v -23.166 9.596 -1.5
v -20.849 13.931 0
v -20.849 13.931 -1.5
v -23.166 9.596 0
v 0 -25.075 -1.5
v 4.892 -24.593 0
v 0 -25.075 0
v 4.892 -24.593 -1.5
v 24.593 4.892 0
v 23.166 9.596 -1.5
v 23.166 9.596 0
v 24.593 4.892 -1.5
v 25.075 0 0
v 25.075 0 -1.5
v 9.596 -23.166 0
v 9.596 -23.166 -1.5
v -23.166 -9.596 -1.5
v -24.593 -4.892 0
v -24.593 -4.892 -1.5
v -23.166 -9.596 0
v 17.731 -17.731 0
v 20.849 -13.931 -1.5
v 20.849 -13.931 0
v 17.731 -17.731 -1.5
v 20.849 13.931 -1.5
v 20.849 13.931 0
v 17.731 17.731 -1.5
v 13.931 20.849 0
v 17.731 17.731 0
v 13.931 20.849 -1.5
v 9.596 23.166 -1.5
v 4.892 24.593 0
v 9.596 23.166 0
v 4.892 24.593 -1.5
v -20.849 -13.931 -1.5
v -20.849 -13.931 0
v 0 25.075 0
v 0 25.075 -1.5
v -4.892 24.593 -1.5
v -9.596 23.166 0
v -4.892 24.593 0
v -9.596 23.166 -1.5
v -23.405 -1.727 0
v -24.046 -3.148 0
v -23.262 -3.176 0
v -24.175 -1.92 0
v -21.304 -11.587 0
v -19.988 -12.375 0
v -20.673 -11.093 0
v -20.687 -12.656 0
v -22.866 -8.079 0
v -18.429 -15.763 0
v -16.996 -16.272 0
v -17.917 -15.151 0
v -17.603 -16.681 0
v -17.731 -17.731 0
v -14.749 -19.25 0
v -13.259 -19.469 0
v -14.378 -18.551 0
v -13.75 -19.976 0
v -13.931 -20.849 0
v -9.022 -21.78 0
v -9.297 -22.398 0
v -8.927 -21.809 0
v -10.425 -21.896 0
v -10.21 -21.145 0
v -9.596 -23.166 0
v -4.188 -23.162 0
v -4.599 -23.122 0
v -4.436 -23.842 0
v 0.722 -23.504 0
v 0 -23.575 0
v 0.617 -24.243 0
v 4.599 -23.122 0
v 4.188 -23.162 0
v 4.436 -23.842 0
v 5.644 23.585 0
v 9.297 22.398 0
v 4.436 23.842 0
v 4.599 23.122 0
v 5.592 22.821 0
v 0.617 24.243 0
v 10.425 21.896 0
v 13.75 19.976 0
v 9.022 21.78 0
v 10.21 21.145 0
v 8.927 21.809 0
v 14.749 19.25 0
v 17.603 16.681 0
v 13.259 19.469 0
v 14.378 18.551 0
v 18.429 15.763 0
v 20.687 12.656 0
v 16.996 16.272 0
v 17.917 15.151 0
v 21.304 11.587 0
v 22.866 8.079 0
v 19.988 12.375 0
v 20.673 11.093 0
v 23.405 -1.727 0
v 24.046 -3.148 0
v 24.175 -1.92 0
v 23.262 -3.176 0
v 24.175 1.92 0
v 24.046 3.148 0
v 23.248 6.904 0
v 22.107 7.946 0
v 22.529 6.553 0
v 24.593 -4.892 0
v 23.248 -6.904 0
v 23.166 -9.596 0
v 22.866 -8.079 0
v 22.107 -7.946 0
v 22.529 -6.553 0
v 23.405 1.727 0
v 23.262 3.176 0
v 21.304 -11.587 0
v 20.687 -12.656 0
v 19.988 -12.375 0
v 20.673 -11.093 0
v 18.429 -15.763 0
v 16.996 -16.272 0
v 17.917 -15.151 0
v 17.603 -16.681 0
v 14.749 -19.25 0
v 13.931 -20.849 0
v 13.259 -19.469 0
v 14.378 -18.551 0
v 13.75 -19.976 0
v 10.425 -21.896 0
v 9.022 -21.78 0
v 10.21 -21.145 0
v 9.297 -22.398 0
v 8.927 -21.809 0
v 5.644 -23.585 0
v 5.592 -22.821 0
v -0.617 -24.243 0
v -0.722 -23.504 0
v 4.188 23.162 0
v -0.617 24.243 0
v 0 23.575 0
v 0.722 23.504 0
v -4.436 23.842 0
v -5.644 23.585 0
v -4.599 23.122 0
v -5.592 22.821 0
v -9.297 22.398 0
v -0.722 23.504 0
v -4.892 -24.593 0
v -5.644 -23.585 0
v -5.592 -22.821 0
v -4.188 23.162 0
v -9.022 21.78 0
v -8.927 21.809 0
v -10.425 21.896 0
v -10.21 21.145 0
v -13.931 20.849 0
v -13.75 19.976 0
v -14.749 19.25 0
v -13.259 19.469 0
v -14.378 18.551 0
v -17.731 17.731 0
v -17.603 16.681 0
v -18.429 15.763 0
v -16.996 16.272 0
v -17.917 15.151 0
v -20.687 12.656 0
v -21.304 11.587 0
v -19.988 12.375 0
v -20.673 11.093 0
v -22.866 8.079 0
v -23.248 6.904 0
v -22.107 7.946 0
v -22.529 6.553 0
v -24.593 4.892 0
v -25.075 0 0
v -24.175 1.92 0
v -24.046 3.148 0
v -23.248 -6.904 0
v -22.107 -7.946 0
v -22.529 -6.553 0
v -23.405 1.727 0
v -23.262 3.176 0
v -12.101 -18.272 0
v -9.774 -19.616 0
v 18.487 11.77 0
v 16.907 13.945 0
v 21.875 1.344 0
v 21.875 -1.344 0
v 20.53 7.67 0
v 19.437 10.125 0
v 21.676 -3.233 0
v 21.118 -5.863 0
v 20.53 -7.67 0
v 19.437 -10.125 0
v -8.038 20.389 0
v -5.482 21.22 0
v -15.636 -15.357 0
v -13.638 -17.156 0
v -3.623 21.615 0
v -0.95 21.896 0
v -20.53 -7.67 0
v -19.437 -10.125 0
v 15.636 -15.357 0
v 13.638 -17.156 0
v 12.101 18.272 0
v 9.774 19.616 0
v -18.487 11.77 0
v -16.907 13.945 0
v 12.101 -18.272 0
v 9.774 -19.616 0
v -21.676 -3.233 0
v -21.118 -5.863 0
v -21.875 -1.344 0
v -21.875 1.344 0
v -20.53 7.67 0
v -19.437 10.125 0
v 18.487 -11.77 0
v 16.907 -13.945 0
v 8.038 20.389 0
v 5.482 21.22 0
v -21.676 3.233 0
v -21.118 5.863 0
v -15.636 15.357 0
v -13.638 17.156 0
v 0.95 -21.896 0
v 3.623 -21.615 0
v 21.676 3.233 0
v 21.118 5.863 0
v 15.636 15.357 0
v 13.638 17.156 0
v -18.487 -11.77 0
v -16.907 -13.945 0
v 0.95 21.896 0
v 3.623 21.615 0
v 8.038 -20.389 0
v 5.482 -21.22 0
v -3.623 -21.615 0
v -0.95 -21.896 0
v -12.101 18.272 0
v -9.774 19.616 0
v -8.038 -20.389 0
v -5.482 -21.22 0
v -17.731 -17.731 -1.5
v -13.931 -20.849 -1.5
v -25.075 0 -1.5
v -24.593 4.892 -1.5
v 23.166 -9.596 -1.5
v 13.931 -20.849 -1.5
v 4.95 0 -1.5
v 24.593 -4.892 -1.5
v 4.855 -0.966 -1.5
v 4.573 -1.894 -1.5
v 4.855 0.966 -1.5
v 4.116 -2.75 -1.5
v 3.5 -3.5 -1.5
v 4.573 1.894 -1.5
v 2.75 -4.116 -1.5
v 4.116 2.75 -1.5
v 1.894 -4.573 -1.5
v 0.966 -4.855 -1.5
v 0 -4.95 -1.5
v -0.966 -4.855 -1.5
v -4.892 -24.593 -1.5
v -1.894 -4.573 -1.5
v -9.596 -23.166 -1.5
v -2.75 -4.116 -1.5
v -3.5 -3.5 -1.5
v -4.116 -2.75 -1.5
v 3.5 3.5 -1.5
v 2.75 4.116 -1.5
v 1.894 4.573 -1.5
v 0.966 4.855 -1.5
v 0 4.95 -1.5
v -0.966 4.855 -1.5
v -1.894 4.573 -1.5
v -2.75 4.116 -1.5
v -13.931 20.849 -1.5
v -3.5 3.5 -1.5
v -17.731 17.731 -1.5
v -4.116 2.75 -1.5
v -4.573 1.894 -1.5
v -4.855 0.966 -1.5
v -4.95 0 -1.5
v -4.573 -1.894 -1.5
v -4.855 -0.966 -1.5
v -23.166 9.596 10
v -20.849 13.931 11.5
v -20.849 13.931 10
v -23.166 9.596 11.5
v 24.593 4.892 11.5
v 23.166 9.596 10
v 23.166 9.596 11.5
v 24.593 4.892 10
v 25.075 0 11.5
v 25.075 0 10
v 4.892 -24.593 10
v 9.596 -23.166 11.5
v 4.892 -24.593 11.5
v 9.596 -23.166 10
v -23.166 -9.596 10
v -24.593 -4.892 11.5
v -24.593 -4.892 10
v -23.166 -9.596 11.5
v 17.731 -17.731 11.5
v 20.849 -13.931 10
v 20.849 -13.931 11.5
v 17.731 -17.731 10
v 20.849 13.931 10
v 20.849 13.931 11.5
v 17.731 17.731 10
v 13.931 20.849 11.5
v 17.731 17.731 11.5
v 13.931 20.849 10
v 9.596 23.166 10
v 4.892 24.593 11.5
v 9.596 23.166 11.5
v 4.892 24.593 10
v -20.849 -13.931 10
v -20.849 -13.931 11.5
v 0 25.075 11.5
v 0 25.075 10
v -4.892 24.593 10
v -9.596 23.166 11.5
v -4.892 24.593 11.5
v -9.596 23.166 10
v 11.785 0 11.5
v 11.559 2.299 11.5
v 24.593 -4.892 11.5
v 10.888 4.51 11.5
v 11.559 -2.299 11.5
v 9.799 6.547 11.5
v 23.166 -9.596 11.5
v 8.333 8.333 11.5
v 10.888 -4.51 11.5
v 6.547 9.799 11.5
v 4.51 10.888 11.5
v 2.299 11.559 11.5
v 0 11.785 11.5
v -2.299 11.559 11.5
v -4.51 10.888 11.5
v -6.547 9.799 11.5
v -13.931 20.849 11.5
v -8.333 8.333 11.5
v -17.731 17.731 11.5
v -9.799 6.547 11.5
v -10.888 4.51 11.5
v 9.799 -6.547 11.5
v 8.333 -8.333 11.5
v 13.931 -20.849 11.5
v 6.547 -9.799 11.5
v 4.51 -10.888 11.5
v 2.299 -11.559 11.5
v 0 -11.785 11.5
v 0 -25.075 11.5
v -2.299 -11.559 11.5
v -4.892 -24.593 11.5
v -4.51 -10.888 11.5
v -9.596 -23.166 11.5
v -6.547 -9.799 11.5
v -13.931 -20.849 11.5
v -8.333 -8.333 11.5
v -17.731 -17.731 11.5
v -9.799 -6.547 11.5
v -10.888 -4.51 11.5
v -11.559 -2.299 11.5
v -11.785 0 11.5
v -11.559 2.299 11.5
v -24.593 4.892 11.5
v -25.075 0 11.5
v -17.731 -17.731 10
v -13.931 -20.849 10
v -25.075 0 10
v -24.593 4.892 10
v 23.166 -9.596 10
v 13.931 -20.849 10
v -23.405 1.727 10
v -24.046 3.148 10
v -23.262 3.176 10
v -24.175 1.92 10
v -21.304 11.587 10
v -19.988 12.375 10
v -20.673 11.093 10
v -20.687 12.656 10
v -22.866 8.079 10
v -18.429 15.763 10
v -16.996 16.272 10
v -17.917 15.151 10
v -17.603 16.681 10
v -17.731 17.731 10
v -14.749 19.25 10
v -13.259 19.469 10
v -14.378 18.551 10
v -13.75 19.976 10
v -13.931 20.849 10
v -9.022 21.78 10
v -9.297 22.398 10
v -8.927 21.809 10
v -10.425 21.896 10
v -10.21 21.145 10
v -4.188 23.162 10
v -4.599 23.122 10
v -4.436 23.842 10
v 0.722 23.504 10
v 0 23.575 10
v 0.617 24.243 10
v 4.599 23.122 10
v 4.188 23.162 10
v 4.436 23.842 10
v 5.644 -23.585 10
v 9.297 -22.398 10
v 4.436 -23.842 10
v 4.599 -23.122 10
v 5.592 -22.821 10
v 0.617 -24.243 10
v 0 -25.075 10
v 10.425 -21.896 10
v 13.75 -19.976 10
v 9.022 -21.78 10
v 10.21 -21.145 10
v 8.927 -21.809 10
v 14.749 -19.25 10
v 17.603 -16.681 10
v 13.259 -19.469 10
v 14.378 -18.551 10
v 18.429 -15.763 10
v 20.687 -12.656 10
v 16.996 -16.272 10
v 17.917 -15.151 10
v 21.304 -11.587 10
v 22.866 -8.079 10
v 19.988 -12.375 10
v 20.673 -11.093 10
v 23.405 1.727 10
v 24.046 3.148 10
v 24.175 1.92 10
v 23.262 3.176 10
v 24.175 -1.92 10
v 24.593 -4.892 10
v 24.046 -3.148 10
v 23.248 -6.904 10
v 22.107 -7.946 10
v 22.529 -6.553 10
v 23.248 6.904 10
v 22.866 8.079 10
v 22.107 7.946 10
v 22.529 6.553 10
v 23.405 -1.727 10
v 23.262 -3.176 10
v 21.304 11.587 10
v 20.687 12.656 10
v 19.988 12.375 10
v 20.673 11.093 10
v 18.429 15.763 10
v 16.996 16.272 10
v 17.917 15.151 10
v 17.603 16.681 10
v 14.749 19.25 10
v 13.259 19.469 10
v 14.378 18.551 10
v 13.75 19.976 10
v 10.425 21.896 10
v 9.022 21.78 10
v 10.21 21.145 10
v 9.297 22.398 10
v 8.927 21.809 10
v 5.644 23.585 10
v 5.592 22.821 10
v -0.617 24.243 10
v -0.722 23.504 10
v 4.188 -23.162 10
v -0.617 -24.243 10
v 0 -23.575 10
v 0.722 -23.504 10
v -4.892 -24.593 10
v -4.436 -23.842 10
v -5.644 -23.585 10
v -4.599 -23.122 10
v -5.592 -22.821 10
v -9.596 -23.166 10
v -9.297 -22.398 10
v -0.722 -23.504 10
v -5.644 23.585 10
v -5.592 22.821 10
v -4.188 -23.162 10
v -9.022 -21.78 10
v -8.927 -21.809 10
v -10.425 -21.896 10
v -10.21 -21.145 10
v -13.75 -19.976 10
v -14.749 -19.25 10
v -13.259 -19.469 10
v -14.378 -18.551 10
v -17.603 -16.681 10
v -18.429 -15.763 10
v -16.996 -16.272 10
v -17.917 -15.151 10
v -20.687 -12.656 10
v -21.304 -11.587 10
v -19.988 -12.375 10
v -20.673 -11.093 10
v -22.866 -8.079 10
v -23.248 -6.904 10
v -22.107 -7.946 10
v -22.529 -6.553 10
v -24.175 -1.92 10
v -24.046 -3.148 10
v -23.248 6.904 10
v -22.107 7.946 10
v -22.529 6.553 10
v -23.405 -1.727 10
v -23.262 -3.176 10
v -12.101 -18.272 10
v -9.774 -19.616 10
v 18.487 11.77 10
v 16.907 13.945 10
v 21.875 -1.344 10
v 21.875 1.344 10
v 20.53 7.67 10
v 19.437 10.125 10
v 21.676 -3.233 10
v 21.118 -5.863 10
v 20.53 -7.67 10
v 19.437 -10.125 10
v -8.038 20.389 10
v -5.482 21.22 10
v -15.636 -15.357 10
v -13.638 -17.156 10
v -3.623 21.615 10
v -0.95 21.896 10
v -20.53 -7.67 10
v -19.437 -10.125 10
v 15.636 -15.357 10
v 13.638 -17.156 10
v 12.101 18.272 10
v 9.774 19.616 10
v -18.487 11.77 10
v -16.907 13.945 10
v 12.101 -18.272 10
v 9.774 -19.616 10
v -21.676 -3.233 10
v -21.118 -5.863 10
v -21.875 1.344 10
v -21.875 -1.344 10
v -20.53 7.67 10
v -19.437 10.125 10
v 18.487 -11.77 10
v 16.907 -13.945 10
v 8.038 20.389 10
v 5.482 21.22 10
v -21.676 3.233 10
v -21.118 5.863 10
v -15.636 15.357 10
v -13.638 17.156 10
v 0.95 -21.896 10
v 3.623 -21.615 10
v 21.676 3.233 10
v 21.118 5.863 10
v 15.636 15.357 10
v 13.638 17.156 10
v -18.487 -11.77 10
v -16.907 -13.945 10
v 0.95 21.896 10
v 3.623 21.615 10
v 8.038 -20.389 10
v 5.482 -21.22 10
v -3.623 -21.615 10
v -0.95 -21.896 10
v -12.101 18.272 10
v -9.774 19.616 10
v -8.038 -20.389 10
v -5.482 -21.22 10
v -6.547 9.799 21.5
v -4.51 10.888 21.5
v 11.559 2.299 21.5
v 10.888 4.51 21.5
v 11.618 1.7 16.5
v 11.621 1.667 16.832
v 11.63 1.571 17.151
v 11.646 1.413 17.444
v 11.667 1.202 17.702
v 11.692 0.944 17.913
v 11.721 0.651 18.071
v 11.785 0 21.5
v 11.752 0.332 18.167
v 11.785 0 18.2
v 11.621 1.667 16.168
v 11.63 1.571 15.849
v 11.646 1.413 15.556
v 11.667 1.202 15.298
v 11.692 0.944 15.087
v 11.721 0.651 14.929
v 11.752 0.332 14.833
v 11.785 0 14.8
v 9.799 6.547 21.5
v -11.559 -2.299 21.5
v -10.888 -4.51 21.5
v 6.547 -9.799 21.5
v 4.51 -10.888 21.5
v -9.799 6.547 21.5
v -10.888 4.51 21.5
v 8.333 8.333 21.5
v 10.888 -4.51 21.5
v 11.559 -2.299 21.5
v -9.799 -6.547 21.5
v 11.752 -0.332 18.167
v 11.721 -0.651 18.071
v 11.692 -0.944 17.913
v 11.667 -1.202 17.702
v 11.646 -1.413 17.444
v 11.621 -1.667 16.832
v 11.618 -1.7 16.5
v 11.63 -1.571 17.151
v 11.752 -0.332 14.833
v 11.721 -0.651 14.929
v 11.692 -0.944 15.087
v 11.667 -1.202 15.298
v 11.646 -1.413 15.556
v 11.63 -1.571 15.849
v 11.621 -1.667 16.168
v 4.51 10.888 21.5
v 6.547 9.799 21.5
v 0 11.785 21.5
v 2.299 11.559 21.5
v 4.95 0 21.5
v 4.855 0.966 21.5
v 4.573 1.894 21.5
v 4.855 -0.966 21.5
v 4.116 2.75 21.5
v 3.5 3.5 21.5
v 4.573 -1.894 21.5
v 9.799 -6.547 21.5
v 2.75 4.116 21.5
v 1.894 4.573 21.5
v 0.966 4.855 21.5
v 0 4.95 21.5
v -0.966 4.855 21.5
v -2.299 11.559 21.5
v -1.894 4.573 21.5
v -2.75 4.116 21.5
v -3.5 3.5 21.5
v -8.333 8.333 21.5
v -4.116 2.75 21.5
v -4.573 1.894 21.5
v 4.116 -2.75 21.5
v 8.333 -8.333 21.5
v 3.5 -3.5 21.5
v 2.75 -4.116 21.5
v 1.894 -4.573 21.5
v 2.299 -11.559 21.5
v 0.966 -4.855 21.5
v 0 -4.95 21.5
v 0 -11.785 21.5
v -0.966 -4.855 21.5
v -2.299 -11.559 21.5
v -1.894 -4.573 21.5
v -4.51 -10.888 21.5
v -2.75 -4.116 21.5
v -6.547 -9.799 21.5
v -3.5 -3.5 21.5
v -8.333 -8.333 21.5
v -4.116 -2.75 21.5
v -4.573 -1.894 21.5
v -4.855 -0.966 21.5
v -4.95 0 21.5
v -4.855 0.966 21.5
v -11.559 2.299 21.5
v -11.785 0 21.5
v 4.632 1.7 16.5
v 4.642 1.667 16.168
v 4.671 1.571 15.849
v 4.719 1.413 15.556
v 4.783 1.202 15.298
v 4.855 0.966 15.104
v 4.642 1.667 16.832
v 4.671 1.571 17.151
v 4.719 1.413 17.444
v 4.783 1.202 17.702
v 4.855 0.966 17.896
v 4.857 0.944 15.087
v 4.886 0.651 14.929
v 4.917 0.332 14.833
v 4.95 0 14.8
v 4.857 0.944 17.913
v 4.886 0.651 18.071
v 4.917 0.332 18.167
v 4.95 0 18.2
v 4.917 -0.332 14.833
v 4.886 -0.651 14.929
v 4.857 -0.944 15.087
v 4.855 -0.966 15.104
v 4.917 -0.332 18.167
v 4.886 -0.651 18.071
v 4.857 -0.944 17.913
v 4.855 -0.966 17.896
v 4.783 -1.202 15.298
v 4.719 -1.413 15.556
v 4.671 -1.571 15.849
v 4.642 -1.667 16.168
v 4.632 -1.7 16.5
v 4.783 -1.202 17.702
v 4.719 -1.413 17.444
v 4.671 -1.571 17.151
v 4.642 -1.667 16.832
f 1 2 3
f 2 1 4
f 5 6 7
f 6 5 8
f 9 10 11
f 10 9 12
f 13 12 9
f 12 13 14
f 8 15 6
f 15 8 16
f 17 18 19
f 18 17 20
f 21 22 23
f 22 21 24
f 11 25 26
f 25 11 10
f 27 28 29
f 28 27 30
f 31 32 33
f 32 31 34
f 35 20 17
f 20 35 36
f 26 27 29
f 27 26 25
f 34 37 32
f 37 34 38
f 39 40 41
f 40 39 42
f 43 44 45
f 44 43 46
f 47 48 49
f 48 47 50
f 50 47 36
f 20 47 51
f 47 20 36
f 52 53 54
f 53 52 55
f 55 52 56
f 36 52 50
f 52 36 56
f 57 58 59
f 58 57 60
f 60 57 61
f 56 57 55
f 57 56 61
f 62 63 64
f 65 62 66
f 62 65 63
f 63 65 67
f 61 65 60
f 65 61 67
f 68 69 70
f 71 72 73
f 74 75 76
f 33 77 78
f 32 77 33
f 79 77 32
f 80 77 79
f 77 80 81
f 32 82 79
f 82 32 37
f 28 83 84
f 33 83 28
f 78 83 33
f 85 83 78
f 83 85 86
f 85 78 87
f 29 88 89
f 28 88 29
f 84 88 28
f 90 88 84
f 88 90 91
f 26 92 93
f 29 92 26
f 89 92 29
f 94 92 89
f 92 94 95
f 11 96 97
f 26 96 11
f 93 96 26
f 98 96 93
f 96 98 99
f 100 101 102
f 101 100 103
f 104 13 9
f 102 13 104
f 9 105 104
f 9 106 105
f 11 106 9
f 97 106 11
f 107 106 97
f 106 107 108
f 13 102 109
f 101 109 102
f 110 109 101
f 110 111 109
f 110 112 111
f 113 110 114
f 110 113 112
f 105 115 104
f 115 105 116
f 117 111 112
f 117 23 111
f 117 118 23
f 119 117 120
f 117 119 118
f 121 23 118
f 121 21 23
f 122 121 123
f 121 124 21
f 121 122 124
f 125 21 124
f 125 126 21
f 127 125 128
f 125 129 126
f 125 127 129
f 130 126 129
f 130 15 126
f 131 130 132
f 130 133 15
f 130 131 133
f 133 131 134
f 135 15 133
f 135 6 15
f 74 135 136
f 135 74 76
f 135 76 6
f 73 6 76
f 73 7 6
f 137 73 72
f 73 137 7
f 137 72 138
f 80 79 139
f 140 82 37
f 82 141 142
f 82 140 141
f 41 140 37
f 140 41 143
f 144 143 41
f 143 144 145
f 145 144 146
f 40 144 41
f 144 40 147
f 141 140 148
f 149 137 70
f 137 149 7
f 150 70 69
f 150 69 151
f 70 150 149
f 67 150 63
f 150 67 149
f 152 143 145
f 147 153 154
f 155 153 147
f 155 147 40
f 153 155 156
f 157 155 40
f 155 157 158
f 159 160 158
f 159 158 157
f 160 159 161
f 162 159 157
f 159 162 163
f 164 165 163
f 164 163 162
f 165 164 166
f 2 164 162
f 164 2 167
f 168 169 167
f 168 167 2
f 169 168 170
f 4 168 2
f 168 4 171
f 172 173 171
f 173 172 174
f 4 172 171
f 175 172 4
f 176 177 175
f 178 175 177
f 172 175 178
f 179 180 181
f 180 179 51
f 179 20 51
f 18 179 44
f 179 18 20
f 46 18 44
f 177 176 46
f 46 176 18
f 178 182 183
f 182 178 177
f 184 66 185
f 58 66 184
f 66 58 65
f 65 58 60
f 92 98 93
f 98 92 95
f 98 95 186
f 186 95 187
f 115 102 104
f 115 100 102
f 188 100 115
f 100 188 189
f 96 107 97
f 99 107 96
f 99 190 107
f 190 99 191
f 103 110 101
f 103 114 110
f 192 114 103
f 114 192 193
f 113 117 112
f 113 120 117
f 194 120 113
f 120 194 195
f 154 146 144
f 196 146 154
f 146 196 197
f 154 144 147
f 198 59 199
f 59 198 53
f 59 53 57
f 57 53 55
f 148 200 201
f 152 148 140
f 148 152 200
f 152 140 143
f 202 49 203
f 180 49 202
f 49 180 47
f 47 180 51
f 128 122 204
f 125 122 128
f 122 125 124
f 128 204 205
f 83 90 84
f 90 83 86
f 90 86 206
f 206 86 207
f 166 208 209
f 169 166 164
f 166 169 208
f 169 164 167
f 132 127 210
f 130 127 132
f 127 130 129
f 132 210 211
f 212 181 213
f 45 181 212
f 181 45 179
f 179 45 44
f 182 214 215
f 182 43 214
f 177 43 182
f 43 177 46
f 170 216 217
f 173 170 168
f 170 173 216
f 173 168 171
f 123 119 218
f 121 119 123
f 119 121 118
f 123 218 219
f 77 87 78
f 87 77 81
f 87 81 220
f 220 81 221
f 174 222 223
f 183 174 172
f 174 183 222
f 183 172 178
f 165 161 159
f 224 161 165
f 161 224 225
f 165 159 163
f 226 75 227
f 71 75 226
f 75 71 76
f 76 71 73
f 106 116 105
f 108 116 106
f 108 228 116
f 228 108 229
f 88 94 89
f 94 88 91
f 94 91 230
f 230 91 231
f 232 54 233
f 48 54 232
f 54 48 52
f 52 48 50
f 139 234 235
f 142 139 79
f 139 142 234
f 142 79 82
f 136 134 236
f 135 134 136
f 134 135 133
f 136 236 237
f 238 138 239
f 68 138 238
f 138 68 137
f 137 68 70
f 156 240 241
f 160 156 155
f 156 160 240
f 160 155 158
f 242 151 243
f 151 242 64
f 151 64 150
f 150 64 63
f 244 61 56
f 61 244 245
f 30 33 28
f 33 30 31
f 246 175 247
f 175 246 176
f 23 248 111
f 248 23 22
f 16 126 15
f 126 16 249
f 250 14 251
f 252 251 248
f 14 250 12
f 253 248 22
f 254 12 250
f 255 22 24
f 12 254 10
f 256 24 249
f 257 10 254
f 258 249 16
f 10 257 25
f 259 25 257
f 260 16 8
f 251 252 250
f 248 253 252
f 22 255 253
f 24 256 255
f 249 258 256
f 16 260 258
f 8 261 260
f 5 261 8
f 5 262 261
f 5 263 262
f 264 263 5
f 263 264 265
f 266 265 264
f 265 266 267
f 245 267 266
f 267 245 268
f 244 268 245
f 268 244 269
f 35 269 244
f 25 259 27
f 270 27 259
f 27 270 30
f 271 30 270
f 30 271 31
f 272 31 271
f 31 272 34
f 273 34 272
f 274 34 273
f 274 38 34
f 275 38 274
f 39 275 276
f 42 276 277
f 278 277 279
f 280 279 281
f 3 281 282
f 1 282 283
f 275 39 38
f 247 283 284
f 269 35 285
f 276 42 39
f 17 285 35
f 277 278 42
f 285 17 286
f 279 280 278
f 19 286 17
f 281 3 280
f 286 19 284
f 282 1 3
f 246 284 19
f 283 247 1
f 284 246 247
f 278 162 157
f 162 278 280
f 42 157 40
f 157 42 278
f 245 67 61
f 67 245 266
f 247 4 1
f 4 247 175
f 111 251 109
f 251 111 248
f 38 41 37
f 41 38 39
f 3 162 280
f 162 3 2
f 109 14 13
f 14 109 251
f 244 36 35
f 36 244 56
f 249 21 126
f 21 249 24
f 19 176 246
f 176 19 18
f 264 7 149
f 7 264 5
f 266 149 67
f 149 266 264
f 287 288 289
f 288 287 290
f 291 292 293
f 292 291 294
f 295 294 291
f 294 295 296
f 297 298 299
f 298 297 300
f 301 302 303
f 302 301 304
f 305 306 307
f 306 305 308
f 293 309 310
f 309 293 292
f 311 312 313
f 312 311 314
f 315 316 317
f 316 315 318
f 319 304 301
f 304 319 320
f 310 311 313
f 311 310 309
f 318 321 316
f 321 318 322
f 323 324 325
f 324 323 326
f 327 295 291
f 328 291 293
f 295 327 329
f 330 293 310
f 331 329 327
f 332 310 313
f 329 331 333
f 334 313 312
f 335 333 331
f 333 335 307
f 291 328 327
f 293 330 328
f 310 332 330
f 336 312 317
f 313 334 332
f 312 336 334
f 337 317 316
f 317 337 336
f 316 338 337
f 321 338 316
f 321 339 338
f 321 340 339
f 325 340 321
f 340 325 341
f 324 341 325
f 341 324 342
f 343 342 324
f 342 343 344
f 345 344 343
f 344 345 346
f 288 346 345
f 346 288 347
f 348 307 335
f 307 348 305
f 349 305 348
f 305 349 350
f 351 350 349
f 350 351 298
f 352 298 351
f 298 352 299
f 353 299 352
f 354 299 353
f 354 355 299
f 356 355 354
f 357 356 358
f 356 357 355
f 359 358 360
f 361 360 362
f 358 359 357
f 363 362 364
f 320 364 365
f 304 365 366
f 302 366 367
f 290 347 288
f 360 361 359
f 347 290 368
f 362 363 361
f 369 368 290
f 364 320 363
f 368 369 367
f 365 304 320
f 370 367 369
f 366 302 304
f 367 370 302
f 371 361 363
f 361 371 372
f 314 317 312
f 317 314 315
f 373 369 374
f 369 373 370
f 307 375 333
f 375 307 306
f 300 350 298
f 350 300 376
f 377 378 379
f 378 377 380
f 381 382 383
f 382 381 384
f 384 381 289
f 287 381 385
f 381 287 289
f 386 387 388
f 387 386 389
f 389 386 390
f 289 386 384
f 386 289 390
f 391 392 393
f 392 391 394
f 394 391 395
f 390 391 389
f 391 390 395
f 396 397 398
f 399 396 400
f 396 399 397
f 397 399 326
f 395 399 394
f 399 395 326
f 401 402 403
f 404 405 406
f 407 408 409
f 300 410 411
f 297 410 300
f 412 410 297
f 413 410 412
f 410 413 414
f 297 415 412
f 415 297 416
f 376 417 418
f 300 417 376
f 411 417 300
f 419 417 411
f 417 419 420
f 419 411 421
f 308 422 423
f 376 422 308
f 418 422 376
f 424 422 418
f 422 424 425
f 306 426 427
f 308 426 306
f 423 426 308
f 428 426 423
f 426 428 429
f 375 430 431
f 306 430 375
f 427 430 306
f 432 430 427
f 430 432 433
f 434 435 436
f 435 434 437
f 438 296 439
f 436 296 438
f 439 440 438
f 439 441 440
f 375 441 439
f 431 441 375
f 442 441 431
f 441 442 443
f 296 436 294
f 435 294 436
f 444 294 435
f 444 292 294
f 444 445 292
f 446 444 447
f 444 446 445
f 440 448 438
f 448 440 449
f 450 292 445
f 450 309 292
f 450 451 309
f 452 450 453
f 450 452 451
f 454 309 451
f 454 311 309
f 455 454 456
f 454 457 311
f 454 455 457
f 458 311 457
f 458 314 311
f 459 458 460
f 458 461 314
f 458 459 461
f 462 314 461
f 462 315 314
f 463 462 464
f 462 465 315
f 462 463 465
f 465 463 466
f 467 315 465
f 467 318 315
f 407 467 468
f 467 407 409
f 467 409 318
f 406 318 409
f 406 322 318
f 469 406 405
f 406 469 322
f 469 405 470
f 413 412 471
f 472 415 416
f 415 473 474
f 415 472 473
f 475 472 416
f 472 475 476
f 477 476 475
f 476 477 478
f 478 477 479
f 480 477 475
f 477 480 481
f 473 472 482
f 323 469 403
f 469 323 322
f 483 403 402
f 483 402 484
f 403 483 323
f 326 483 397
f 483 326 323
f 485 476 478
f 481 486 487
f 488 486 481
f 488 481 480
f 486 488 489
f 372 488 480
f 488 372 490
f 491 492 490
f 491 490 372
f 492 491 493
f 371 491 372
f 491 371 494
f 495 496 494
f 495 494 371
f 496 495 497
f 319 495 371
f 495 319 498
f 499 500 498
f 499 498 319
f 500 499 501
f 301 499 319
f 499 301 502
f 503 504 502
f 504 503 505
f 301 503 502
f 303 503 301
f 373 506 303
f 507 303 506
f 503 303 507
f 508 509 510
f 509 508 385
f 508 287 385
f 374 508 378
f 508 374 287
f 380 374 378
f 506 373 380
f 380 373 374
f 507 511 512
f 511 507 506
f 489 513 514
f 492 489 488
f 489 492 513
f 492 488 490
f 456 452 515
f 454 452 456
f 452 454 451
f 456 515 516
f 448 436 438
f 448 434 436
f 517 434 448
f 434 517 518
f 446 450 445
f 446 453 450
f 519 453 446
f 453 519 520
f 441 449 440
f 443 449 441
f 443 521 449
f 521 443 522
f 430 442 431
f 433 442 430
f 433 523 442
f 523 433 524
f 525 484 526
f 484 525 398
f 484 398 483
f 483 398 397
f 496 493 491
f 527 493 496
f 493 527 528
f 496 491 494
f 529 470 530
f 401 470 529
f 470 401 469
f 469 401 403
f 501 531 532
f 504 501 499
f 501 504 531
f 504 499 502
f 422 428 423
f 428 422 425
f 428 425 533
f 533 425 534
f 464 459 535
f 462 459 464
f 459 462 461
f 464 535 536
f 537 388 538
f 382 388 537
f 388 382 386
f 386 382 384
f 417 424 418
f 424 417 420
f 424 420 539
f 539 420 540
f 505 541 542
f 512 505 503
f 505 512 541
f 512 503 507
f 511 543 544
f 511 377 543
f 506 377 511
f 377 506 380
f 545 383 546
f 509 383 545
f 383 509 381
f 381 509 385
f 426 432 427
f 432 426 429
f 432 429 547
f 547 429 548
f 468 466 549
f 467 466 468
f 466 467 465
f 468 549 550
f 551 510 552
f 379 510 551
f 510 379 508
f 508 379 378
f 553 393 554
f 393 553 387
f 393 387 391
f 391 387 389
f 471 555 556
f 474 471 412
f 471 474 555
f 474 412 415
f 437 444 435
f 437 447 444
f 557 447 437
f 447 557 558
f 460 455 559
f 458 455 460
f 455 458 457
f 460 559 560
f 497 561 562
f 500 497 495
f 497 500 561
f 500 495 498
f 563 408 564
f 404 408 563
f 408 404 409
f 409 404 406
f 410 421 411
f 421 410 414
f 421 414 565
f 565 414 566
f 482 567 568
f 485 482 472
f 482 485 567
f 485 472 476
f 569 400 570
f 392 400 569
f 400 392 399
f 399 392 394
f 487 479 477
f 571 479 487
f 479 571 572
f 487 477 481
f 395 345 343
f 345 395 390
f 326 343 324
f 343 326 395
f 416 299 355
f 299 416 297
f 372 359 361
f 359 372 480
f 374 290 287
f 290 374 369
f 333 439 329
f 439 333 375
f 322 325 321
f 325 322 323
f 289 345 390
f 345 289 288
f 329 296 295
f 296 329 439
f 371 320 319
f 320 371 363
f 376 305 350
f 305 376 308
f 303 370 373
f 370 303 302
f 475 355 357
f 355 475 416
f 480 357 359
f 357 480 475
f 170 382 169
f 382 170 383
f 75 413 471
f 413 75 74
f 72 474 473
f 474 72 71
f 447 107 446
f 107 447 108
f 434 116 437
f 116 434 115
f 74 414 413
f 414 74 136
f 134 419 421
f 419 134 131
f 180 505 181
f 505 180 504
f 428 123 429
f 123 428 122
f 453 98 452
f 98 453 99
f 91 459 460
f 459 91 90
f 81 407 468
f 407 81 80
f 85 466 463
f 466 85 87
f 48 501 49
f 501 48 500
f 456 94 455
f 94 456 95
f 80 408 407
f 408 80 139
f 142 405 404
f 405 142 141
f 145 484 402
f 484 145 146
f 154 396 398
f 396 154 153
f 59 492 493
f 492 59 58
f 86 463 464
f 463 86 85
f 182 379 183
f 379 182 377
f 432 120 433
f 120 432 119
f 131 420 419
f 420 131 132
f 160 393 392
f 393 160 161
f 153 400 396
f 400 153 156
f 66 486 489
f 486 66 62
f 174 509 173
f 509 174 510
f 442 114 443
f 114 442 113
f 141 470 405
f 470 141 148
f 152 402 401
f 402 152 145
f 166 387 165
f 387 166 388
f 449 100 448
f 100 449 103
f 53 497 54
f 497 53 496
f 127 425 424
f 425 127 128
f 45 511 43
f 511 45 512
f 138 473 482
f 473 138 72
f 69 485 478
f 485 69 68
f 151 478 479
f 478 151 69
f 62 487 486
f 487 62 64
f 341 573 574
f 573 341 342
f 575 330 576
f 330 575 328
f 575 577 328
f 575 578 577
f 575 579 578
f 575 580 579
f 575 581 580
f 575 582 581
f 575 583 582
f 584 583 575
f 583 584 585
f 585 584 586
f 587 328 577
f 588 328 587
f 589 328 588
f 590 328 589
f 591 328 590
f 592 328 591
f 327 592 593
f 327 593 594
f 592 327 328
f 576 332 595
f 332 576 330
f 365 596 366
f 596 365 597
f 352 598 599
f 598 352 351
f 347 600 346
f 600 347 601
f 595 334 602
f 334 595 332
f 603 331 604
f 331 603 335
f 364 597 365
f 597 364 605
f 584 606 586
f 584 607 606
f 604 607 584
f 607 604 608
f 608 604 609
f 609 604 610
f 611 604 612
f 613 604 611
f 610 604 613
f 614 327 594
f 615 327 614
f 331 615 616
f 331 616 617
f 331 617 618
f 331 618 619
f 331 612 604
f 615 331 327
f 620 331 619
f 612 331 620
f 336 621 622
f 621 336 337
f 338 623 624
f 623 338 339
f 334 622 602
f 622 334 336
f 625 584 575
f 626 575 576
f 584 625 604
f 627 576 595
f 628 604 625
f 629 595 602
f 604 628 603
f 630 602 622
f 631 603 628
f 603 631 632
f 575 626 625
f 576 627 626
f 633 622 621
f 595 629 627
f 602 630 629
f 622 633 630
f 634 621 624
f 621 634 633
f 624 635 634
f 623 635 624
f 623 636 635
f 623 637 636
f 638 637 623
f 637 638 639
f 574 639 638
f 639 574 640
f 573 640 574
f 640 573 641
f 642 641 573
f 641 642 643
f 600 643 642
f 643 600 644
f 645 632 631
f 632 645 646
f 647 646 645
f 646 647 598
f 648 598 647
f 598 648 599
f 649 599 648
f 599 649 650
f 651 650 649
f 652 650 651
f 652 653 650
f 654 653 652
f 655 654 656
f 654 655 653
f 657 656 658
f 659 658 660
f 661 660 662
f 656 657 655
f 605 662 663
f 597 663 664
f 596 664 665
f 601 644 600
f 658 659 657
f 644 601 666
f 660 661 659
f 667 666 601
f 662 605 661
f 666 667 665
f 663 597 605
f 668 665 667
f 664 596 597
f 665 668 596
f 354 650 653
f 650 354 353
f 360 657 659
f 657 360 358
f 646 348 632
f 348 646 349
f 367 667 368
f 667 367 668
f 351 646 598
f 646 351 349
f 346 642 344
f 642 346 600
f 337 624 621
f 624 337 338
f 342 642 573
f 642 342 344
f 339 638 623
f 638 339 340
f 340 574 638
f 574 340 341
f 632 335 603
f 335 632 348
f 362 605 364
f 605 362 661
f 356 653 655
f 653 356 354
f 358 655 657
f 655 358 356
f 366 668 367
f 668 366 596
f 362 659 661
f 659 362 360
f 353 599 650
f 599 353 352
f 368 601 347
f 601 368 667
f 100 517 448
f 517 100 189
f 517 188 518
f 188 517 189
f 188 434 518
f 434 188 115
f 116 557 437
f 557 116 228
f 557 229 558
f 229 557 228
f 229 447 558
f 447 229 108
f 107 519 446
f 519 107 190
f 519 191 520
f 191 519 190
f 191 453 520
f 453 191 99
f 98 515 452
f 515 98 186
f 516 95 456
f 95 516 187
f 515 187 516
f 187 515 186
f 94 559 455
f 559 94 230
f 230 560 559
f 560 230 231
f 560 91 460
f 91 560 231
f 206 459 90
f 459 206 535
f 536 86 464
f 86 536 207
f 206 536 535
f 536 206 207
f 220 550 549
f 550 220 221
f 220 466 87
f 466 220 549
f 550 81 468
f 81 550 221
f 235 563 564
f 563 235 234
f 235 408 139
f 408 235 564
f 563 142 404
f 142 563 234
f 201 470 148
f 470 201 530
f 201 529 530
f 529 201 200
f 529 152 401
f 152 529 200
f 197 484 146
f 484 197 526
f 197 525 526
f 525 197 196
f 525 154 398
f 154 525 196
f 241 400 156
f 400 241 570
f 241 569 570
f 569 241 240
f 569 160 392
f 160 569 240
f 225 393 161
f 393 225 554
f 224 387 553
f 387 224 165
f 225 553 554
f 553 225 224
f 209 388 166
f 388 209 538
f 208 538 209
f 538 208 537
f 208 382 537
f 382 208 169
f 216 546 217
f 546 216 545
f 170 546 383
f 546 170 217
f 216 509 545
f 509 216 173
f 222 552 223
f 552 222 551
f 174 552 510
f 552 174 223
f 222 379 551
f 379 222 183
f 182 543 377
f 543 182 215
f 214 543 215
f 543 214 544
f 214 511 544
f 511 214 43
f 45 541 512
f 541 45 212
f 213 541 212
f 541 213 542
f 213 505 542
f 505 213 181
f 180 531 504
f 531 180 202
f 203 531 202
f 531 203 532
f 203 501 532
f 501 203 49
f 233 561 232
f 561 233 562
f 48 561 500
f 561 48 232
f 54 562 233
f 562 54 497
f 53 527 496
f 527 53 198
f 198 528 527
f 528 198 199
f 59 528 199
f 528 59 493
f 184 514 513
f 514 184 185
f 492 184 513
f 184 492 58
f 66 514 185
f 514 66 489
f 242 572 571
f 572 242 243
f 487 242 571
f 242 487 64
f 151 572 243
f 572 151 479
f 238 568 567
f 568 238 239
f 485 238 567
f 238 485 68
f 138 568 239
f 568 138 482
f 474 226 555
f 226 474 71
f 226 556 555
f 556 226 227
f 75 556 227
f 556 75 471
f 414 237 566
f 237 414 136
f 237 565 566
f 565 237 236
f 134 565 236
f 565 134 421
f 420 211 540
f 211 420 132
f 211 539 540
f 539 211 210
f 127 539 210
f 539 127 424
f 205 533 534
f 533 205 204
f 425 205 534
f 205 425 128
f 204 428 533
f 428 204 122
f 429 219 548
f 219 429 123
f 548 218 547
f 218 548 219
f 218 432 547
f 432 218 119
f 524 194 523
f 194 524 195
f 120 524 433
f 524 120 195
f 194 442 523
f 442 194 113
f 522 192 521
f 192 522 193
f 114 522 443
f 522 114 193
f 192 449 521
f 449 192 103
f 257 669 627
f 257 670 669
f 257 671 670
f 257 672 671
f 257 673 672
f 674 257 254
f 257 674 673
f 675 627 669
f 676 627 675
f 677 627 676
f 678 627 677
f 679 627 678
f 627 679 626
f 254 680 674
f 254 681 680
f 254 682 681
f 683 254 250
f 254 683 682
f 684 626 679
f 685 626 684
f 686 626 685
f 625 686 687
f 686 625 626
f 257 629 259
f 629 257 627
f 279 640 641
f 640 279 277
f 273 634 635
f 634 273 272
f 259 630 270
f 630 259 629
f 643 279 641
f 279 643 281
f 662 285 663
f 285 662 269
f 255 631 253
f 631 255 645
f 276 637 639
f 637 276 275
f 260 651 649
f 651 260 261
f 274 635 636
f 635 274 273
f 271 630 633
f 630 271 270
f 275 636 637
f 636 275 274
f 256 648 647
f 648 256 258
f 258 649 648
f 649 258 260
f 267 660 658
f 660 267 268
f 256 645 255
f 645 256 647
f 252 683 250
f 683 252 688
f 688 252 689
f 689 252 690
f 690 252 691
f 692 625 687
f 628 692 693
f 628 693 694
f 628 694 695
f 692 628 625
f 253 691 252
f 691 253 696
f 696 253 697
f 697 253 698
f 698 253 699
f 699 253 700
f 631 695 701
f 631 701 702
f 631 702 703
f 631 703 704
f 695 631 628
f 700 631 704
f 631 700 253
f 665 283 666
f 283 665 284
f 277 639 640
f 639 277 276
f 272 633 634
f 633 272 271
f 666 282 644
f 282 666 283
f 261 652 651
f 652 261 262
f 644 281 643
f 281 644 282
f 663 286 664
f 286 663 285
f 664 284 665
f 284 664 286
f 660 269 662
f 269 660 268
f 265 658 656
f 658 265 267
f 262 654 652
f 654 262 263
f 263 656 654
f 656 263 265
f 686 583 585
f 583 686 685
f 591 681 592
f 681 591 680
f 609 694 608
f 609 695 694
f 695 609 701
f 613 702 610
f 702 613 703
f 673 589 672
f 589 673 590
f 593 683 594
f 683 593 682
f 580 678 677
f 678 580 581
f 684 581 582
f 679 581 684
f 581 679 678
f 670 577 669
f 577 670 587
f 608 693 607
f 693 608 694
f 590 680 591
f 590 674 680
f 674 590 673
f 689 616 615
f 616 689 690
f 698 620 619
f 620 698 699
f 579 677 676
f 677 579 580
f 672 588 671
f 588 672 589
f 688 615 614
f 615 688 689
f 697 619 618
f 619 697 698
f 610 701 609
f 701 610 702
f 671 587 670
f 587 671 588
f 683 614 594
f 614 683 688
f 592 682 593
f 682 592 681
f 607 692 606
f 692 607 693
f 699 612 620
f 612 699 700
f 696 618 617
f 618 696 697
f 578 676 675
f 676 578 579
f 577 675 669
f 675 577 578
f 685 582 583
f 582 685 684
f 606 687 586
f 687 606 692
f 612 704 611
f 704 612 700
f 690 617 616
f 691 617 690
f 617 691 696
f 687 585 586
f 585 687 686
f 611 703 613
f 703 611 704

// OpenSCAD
$fn = 32;

// ----------------------------------------------------------------------
// Timing pulley: HTD5 30T, pitch 5 mm, 50.15 mm x 23 mm
// ----------------------------------------------------------------------

// --- parameters (mm) ---
belt_pitch = 5;           // belt pitch
n_teeth = 30;             // number of grooves
rim_w = 10;               // belt width between the flanges
tip_d = 47.15;            // tip circle diameter
root_d = 44.95;           // groove bottom diameter
groove_h = 1.1;           // groove depth
tooth_w = 3.2;            // groove width at the tip circle
rim_d = 50.15;            // flange diameter
rim_t = 1.5;              // flange thickness
spigot_d = 43.35;         // flange spigot, sunk into the rim
spigot_h = 1.2;           // spigot depth into the rim
shaft_d = 9.9;            // shaft bore
hub_d = 23.57;            // hub diameter
hub_h = 10;               // hub above the flange
bottom_z = -1.5;          // lowest point of the pulley
top_z = 21.5;             // highest point of the pulley
set_d = 3.4;              // set screw tap hole

module rim() {
  cylinder(h = rim_w, d = tip_d);
}

module groove_cutter() {
  /* belt tooth groove: deeper than wide, cut through the belt width */
  translate([root_d / 2, 0, 0])
    linear_extrude(height = rim_w)
      polygon(points = [[-0.6, -tooth_w * 0.42], [groove_h + 0.6, -tooth_w * 0.6],
                        [groove_h + 0.6, tooth_w * 0.6], [-0.6, tooth_w * 0.42]]);
}

module flanges() {
  translate([0, 0, -rim_t]) cylinder(h = rim_t, d = rim_d);
  translate([0, 0, rim_w]) cylinder(h = rim_t, d = rim_d);
  translate([0, 0, -spigot_h]) cylinder(h = spigot_h + 0.6, d = spigot_d);
  translate([0, 0, rim_w - 0.6]) cylinder(h = spigot_h + 0.6, d = spigot_d);
}

module hub() {
  translate([0, 0, bottom_z]) cylinder(h = top_z - bottom_z, d = hub_d);
}

difference() {
  union() {
    rim();
    hub();
    flanges();
  }
  for (i = [0 : n_teeth - 1]) rotate([0, 0, i * 360 / n_teeth]) groove_cutter();
  translate([0, 0, bottom_z - 1]) cylinder(h = top_z - bottom_z + 2, d = shaft_d);
  translate([-1, 0, top_z - hub_h * 0.5]) rotate([0, 90, 0]) cylinder(h = hub_d / 2 + 3, d = set_d);
}
